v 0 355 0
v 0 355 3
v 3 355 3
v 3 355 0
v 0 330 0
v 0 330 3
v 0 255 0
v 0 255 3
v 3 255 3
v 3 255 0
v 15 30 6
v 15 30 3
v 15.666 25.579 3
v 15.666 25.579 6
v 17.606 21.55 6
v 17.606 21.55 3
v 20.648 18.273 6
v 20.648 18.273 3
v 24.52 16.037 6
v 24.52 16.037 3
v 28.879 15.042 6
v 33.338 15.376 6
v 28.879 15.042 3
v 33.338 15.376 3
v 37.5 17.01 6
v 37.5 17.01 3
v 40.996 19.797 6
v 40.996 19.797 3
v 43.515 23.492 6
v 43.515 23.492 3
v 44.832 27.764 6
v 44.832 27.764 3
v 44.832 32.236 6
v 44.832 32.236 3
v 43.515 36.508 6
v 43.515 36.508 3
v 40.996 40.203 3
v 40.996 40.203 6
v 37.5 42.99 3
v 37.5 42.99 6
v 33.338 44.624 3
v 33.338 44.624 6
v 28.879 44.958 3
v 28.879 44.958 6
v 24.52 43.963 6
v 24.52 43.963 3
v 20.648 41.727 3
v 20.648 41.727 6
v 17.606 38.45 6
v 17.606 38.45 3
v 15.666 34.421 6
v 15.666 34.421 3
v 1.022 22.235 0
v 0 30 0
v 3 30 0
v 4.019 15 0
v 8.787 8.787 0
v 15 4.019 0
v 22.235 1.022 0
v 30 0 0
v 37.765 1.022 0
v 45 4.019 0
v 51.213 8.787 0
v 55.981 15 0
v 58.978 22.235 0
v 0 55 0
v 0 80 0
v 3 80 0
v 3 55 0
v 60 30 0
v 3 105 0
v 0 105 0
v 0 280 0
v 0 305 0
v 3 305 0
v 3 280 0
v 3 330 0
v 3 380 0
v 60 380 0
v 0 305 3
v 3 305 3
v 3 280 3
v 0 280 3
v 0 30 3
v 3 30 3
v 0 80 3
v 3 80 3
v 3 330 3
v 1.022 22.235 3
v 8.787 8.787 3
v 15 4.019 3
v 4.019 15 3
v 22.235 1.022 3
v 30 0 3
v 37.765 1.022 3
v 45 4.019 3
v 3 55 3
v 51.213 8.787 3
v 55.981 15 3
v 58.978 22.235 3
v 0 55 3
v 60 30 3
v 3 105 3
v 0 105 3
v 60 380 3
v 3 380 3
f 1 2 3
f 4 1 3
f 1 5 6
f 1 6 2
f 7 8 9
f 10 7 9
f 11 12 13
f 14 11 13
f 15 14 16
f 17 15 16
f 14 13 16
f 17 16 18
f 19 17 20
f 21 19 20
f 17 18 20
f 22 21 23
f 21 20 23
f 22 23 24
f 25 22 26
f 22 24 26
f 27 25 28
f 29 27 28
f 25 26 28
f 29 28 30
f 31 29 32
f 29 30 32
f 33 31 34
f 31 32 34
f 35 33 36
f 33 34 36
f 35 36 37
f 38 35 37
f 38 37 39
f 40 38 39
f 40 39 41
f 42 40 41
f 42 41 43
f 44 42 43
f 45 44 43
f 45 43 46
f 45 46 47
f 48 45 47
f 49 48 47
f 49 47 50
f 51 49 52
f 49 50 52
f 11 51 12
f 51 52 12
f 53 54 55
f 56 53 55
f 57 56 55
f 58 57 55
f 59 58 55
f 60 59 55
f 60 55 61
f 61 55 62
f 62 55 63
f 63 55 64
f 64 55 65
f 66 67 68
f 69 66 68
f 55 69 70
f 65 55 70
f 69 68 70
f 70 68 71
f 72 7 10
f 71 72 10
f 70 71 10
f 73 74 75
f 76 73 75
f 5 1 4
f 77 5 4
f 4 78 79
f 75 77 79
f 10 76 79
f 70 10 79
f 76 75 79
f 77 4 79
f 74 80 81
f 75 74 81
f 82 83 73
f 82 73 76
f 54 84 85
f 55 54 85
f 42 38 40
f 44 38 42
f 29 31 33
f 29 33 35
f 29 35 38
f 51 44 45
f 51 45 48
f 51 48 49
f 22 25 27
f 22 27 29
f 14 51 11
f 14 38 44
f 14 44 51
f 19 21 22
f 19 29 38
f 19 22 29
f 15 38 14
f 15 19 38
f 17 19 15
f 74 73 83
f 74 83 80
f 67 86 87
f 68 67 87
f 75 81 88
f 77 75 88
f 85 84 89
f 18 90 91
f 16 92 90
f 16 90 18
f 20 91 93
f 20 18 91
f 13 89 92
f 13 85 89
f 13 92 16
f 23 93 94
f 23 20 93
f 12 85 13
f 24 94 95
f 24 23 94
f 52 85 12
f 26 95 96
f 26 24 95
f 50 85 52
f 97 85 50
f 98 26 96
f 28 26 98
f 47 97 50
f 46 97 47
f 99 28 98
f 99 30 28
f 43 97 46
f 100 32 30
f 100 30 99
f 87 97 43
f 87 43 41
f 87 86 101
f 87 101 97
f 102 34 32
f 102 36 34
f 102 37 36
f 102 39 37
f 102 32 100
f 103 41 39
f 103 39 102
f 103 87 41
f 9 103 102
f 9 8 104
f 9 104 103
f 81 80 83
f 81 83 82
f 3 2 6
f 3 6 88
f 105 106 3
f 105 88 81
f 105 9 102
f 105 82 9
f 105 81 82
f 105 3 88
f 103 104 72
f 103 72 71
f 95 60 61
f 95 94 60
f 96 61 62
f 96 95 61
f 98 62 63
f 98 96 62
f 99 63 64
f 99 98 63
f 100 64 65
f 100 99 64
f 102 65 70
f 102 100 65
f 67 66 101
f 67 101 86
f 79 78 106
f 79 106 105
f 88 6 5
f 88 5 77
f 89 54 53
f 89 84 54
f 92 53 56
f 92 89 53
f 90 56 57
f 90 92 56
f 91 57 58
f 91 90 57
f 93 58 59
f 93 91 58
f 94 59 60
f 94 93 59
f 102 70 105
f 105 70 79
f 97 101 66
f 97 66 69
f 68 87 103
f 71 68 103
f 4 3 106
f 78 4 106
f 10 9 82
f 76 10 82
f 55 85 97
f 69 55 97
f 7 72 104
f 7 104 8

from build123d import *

# Parameters (mm, degrees)
ESQUISSE1_W             = 60
ESQUISSE1_H             = 380
BOSS_EXTRU_1_DEPTH      = 3
CONG_1_R                = 30
ESQUISSE2_W             = 3
ESQUISSE2_H             = 25
ENL_V_MAT_EXTRU_1_DEPTH = 3
ESQUISSE3_R             = 15
BOSS_EXTRU_2_DEPTH      = 3
ESQUISSE4_W             = 3
ESQUISSE4_H             = 25
ENL_V_MAT_EXTRU_2_DEPTH = 3


with BuildPart() as part:
    # Esquisse1 → Boss.-Extru.1 (new body)
    with BuildSketch(Plane.XY):
        with Locations((30, 190)):
            Rectangle(ESQUISSE1_W, ESQUISSE1_H)
    extrude(amount=BOSS_EXTRU_1_DEPTH)

    # Congé1
    cong_1_edges = [part.edges().sort_by_distance(p)[0] for p in [
        (0, 0, 1.5),
        (60, 0, 1.5),
    ]]
    fillet(cong_1_edges, radius=CONG_1_R - 0.0001)  # a hair under: the kernel refuses the full size

    # Esquisse2 → Enlèv. mat.-Extru.1 (cut)
    with BuildSketch(Plane.XY.offset(3)):
        with Locations((1.5, 367.5)):
            Rectangle(ESQUISSE2_W, ESQUISSE2_H)
        with Locations((1.5, 317.5)):
            Rectangle(ESQUISSE2_W, ESQUISSE2_H)
        with Locations((1.5, 267.5)):
            Rectangle(ESQUISSE2_W, ESQUISSE2_H)
    extrude(amount=-ENL_V_MAT_EXTRU_1_DEPTH, mode=Mode.SUBTRACT)

    # Esquisse3 → Boss.-Extru.2 (add)
    with BuildSketch(Plane.XY.offset(3)):
        with Locations(Location((30, 30, 0), (0, 0, 180))):
            Circle(ESQUISSE3_R)
    extrude(amount=BOSS_EXTRU_2_DEPTH)

    # Esquisse4 → Enlèv. mat.-Extru.2 (cut)
    with BuildSketch(Plane.XY.offset(3)):
        with Locations((1.5, 42.5)):
            Rectangle(ESQUISSE4_W, ESQUISSE4_H)
        with Locations((1.5, 92.5)):
            Rectangle(ESQUISSE4_W, ESQUISSE4_H)
    extrude(amount=-ENL_V_MAT_EXTRU_2_DEPTH, mode=Mode.SUBTRACT)


solid = part.part
